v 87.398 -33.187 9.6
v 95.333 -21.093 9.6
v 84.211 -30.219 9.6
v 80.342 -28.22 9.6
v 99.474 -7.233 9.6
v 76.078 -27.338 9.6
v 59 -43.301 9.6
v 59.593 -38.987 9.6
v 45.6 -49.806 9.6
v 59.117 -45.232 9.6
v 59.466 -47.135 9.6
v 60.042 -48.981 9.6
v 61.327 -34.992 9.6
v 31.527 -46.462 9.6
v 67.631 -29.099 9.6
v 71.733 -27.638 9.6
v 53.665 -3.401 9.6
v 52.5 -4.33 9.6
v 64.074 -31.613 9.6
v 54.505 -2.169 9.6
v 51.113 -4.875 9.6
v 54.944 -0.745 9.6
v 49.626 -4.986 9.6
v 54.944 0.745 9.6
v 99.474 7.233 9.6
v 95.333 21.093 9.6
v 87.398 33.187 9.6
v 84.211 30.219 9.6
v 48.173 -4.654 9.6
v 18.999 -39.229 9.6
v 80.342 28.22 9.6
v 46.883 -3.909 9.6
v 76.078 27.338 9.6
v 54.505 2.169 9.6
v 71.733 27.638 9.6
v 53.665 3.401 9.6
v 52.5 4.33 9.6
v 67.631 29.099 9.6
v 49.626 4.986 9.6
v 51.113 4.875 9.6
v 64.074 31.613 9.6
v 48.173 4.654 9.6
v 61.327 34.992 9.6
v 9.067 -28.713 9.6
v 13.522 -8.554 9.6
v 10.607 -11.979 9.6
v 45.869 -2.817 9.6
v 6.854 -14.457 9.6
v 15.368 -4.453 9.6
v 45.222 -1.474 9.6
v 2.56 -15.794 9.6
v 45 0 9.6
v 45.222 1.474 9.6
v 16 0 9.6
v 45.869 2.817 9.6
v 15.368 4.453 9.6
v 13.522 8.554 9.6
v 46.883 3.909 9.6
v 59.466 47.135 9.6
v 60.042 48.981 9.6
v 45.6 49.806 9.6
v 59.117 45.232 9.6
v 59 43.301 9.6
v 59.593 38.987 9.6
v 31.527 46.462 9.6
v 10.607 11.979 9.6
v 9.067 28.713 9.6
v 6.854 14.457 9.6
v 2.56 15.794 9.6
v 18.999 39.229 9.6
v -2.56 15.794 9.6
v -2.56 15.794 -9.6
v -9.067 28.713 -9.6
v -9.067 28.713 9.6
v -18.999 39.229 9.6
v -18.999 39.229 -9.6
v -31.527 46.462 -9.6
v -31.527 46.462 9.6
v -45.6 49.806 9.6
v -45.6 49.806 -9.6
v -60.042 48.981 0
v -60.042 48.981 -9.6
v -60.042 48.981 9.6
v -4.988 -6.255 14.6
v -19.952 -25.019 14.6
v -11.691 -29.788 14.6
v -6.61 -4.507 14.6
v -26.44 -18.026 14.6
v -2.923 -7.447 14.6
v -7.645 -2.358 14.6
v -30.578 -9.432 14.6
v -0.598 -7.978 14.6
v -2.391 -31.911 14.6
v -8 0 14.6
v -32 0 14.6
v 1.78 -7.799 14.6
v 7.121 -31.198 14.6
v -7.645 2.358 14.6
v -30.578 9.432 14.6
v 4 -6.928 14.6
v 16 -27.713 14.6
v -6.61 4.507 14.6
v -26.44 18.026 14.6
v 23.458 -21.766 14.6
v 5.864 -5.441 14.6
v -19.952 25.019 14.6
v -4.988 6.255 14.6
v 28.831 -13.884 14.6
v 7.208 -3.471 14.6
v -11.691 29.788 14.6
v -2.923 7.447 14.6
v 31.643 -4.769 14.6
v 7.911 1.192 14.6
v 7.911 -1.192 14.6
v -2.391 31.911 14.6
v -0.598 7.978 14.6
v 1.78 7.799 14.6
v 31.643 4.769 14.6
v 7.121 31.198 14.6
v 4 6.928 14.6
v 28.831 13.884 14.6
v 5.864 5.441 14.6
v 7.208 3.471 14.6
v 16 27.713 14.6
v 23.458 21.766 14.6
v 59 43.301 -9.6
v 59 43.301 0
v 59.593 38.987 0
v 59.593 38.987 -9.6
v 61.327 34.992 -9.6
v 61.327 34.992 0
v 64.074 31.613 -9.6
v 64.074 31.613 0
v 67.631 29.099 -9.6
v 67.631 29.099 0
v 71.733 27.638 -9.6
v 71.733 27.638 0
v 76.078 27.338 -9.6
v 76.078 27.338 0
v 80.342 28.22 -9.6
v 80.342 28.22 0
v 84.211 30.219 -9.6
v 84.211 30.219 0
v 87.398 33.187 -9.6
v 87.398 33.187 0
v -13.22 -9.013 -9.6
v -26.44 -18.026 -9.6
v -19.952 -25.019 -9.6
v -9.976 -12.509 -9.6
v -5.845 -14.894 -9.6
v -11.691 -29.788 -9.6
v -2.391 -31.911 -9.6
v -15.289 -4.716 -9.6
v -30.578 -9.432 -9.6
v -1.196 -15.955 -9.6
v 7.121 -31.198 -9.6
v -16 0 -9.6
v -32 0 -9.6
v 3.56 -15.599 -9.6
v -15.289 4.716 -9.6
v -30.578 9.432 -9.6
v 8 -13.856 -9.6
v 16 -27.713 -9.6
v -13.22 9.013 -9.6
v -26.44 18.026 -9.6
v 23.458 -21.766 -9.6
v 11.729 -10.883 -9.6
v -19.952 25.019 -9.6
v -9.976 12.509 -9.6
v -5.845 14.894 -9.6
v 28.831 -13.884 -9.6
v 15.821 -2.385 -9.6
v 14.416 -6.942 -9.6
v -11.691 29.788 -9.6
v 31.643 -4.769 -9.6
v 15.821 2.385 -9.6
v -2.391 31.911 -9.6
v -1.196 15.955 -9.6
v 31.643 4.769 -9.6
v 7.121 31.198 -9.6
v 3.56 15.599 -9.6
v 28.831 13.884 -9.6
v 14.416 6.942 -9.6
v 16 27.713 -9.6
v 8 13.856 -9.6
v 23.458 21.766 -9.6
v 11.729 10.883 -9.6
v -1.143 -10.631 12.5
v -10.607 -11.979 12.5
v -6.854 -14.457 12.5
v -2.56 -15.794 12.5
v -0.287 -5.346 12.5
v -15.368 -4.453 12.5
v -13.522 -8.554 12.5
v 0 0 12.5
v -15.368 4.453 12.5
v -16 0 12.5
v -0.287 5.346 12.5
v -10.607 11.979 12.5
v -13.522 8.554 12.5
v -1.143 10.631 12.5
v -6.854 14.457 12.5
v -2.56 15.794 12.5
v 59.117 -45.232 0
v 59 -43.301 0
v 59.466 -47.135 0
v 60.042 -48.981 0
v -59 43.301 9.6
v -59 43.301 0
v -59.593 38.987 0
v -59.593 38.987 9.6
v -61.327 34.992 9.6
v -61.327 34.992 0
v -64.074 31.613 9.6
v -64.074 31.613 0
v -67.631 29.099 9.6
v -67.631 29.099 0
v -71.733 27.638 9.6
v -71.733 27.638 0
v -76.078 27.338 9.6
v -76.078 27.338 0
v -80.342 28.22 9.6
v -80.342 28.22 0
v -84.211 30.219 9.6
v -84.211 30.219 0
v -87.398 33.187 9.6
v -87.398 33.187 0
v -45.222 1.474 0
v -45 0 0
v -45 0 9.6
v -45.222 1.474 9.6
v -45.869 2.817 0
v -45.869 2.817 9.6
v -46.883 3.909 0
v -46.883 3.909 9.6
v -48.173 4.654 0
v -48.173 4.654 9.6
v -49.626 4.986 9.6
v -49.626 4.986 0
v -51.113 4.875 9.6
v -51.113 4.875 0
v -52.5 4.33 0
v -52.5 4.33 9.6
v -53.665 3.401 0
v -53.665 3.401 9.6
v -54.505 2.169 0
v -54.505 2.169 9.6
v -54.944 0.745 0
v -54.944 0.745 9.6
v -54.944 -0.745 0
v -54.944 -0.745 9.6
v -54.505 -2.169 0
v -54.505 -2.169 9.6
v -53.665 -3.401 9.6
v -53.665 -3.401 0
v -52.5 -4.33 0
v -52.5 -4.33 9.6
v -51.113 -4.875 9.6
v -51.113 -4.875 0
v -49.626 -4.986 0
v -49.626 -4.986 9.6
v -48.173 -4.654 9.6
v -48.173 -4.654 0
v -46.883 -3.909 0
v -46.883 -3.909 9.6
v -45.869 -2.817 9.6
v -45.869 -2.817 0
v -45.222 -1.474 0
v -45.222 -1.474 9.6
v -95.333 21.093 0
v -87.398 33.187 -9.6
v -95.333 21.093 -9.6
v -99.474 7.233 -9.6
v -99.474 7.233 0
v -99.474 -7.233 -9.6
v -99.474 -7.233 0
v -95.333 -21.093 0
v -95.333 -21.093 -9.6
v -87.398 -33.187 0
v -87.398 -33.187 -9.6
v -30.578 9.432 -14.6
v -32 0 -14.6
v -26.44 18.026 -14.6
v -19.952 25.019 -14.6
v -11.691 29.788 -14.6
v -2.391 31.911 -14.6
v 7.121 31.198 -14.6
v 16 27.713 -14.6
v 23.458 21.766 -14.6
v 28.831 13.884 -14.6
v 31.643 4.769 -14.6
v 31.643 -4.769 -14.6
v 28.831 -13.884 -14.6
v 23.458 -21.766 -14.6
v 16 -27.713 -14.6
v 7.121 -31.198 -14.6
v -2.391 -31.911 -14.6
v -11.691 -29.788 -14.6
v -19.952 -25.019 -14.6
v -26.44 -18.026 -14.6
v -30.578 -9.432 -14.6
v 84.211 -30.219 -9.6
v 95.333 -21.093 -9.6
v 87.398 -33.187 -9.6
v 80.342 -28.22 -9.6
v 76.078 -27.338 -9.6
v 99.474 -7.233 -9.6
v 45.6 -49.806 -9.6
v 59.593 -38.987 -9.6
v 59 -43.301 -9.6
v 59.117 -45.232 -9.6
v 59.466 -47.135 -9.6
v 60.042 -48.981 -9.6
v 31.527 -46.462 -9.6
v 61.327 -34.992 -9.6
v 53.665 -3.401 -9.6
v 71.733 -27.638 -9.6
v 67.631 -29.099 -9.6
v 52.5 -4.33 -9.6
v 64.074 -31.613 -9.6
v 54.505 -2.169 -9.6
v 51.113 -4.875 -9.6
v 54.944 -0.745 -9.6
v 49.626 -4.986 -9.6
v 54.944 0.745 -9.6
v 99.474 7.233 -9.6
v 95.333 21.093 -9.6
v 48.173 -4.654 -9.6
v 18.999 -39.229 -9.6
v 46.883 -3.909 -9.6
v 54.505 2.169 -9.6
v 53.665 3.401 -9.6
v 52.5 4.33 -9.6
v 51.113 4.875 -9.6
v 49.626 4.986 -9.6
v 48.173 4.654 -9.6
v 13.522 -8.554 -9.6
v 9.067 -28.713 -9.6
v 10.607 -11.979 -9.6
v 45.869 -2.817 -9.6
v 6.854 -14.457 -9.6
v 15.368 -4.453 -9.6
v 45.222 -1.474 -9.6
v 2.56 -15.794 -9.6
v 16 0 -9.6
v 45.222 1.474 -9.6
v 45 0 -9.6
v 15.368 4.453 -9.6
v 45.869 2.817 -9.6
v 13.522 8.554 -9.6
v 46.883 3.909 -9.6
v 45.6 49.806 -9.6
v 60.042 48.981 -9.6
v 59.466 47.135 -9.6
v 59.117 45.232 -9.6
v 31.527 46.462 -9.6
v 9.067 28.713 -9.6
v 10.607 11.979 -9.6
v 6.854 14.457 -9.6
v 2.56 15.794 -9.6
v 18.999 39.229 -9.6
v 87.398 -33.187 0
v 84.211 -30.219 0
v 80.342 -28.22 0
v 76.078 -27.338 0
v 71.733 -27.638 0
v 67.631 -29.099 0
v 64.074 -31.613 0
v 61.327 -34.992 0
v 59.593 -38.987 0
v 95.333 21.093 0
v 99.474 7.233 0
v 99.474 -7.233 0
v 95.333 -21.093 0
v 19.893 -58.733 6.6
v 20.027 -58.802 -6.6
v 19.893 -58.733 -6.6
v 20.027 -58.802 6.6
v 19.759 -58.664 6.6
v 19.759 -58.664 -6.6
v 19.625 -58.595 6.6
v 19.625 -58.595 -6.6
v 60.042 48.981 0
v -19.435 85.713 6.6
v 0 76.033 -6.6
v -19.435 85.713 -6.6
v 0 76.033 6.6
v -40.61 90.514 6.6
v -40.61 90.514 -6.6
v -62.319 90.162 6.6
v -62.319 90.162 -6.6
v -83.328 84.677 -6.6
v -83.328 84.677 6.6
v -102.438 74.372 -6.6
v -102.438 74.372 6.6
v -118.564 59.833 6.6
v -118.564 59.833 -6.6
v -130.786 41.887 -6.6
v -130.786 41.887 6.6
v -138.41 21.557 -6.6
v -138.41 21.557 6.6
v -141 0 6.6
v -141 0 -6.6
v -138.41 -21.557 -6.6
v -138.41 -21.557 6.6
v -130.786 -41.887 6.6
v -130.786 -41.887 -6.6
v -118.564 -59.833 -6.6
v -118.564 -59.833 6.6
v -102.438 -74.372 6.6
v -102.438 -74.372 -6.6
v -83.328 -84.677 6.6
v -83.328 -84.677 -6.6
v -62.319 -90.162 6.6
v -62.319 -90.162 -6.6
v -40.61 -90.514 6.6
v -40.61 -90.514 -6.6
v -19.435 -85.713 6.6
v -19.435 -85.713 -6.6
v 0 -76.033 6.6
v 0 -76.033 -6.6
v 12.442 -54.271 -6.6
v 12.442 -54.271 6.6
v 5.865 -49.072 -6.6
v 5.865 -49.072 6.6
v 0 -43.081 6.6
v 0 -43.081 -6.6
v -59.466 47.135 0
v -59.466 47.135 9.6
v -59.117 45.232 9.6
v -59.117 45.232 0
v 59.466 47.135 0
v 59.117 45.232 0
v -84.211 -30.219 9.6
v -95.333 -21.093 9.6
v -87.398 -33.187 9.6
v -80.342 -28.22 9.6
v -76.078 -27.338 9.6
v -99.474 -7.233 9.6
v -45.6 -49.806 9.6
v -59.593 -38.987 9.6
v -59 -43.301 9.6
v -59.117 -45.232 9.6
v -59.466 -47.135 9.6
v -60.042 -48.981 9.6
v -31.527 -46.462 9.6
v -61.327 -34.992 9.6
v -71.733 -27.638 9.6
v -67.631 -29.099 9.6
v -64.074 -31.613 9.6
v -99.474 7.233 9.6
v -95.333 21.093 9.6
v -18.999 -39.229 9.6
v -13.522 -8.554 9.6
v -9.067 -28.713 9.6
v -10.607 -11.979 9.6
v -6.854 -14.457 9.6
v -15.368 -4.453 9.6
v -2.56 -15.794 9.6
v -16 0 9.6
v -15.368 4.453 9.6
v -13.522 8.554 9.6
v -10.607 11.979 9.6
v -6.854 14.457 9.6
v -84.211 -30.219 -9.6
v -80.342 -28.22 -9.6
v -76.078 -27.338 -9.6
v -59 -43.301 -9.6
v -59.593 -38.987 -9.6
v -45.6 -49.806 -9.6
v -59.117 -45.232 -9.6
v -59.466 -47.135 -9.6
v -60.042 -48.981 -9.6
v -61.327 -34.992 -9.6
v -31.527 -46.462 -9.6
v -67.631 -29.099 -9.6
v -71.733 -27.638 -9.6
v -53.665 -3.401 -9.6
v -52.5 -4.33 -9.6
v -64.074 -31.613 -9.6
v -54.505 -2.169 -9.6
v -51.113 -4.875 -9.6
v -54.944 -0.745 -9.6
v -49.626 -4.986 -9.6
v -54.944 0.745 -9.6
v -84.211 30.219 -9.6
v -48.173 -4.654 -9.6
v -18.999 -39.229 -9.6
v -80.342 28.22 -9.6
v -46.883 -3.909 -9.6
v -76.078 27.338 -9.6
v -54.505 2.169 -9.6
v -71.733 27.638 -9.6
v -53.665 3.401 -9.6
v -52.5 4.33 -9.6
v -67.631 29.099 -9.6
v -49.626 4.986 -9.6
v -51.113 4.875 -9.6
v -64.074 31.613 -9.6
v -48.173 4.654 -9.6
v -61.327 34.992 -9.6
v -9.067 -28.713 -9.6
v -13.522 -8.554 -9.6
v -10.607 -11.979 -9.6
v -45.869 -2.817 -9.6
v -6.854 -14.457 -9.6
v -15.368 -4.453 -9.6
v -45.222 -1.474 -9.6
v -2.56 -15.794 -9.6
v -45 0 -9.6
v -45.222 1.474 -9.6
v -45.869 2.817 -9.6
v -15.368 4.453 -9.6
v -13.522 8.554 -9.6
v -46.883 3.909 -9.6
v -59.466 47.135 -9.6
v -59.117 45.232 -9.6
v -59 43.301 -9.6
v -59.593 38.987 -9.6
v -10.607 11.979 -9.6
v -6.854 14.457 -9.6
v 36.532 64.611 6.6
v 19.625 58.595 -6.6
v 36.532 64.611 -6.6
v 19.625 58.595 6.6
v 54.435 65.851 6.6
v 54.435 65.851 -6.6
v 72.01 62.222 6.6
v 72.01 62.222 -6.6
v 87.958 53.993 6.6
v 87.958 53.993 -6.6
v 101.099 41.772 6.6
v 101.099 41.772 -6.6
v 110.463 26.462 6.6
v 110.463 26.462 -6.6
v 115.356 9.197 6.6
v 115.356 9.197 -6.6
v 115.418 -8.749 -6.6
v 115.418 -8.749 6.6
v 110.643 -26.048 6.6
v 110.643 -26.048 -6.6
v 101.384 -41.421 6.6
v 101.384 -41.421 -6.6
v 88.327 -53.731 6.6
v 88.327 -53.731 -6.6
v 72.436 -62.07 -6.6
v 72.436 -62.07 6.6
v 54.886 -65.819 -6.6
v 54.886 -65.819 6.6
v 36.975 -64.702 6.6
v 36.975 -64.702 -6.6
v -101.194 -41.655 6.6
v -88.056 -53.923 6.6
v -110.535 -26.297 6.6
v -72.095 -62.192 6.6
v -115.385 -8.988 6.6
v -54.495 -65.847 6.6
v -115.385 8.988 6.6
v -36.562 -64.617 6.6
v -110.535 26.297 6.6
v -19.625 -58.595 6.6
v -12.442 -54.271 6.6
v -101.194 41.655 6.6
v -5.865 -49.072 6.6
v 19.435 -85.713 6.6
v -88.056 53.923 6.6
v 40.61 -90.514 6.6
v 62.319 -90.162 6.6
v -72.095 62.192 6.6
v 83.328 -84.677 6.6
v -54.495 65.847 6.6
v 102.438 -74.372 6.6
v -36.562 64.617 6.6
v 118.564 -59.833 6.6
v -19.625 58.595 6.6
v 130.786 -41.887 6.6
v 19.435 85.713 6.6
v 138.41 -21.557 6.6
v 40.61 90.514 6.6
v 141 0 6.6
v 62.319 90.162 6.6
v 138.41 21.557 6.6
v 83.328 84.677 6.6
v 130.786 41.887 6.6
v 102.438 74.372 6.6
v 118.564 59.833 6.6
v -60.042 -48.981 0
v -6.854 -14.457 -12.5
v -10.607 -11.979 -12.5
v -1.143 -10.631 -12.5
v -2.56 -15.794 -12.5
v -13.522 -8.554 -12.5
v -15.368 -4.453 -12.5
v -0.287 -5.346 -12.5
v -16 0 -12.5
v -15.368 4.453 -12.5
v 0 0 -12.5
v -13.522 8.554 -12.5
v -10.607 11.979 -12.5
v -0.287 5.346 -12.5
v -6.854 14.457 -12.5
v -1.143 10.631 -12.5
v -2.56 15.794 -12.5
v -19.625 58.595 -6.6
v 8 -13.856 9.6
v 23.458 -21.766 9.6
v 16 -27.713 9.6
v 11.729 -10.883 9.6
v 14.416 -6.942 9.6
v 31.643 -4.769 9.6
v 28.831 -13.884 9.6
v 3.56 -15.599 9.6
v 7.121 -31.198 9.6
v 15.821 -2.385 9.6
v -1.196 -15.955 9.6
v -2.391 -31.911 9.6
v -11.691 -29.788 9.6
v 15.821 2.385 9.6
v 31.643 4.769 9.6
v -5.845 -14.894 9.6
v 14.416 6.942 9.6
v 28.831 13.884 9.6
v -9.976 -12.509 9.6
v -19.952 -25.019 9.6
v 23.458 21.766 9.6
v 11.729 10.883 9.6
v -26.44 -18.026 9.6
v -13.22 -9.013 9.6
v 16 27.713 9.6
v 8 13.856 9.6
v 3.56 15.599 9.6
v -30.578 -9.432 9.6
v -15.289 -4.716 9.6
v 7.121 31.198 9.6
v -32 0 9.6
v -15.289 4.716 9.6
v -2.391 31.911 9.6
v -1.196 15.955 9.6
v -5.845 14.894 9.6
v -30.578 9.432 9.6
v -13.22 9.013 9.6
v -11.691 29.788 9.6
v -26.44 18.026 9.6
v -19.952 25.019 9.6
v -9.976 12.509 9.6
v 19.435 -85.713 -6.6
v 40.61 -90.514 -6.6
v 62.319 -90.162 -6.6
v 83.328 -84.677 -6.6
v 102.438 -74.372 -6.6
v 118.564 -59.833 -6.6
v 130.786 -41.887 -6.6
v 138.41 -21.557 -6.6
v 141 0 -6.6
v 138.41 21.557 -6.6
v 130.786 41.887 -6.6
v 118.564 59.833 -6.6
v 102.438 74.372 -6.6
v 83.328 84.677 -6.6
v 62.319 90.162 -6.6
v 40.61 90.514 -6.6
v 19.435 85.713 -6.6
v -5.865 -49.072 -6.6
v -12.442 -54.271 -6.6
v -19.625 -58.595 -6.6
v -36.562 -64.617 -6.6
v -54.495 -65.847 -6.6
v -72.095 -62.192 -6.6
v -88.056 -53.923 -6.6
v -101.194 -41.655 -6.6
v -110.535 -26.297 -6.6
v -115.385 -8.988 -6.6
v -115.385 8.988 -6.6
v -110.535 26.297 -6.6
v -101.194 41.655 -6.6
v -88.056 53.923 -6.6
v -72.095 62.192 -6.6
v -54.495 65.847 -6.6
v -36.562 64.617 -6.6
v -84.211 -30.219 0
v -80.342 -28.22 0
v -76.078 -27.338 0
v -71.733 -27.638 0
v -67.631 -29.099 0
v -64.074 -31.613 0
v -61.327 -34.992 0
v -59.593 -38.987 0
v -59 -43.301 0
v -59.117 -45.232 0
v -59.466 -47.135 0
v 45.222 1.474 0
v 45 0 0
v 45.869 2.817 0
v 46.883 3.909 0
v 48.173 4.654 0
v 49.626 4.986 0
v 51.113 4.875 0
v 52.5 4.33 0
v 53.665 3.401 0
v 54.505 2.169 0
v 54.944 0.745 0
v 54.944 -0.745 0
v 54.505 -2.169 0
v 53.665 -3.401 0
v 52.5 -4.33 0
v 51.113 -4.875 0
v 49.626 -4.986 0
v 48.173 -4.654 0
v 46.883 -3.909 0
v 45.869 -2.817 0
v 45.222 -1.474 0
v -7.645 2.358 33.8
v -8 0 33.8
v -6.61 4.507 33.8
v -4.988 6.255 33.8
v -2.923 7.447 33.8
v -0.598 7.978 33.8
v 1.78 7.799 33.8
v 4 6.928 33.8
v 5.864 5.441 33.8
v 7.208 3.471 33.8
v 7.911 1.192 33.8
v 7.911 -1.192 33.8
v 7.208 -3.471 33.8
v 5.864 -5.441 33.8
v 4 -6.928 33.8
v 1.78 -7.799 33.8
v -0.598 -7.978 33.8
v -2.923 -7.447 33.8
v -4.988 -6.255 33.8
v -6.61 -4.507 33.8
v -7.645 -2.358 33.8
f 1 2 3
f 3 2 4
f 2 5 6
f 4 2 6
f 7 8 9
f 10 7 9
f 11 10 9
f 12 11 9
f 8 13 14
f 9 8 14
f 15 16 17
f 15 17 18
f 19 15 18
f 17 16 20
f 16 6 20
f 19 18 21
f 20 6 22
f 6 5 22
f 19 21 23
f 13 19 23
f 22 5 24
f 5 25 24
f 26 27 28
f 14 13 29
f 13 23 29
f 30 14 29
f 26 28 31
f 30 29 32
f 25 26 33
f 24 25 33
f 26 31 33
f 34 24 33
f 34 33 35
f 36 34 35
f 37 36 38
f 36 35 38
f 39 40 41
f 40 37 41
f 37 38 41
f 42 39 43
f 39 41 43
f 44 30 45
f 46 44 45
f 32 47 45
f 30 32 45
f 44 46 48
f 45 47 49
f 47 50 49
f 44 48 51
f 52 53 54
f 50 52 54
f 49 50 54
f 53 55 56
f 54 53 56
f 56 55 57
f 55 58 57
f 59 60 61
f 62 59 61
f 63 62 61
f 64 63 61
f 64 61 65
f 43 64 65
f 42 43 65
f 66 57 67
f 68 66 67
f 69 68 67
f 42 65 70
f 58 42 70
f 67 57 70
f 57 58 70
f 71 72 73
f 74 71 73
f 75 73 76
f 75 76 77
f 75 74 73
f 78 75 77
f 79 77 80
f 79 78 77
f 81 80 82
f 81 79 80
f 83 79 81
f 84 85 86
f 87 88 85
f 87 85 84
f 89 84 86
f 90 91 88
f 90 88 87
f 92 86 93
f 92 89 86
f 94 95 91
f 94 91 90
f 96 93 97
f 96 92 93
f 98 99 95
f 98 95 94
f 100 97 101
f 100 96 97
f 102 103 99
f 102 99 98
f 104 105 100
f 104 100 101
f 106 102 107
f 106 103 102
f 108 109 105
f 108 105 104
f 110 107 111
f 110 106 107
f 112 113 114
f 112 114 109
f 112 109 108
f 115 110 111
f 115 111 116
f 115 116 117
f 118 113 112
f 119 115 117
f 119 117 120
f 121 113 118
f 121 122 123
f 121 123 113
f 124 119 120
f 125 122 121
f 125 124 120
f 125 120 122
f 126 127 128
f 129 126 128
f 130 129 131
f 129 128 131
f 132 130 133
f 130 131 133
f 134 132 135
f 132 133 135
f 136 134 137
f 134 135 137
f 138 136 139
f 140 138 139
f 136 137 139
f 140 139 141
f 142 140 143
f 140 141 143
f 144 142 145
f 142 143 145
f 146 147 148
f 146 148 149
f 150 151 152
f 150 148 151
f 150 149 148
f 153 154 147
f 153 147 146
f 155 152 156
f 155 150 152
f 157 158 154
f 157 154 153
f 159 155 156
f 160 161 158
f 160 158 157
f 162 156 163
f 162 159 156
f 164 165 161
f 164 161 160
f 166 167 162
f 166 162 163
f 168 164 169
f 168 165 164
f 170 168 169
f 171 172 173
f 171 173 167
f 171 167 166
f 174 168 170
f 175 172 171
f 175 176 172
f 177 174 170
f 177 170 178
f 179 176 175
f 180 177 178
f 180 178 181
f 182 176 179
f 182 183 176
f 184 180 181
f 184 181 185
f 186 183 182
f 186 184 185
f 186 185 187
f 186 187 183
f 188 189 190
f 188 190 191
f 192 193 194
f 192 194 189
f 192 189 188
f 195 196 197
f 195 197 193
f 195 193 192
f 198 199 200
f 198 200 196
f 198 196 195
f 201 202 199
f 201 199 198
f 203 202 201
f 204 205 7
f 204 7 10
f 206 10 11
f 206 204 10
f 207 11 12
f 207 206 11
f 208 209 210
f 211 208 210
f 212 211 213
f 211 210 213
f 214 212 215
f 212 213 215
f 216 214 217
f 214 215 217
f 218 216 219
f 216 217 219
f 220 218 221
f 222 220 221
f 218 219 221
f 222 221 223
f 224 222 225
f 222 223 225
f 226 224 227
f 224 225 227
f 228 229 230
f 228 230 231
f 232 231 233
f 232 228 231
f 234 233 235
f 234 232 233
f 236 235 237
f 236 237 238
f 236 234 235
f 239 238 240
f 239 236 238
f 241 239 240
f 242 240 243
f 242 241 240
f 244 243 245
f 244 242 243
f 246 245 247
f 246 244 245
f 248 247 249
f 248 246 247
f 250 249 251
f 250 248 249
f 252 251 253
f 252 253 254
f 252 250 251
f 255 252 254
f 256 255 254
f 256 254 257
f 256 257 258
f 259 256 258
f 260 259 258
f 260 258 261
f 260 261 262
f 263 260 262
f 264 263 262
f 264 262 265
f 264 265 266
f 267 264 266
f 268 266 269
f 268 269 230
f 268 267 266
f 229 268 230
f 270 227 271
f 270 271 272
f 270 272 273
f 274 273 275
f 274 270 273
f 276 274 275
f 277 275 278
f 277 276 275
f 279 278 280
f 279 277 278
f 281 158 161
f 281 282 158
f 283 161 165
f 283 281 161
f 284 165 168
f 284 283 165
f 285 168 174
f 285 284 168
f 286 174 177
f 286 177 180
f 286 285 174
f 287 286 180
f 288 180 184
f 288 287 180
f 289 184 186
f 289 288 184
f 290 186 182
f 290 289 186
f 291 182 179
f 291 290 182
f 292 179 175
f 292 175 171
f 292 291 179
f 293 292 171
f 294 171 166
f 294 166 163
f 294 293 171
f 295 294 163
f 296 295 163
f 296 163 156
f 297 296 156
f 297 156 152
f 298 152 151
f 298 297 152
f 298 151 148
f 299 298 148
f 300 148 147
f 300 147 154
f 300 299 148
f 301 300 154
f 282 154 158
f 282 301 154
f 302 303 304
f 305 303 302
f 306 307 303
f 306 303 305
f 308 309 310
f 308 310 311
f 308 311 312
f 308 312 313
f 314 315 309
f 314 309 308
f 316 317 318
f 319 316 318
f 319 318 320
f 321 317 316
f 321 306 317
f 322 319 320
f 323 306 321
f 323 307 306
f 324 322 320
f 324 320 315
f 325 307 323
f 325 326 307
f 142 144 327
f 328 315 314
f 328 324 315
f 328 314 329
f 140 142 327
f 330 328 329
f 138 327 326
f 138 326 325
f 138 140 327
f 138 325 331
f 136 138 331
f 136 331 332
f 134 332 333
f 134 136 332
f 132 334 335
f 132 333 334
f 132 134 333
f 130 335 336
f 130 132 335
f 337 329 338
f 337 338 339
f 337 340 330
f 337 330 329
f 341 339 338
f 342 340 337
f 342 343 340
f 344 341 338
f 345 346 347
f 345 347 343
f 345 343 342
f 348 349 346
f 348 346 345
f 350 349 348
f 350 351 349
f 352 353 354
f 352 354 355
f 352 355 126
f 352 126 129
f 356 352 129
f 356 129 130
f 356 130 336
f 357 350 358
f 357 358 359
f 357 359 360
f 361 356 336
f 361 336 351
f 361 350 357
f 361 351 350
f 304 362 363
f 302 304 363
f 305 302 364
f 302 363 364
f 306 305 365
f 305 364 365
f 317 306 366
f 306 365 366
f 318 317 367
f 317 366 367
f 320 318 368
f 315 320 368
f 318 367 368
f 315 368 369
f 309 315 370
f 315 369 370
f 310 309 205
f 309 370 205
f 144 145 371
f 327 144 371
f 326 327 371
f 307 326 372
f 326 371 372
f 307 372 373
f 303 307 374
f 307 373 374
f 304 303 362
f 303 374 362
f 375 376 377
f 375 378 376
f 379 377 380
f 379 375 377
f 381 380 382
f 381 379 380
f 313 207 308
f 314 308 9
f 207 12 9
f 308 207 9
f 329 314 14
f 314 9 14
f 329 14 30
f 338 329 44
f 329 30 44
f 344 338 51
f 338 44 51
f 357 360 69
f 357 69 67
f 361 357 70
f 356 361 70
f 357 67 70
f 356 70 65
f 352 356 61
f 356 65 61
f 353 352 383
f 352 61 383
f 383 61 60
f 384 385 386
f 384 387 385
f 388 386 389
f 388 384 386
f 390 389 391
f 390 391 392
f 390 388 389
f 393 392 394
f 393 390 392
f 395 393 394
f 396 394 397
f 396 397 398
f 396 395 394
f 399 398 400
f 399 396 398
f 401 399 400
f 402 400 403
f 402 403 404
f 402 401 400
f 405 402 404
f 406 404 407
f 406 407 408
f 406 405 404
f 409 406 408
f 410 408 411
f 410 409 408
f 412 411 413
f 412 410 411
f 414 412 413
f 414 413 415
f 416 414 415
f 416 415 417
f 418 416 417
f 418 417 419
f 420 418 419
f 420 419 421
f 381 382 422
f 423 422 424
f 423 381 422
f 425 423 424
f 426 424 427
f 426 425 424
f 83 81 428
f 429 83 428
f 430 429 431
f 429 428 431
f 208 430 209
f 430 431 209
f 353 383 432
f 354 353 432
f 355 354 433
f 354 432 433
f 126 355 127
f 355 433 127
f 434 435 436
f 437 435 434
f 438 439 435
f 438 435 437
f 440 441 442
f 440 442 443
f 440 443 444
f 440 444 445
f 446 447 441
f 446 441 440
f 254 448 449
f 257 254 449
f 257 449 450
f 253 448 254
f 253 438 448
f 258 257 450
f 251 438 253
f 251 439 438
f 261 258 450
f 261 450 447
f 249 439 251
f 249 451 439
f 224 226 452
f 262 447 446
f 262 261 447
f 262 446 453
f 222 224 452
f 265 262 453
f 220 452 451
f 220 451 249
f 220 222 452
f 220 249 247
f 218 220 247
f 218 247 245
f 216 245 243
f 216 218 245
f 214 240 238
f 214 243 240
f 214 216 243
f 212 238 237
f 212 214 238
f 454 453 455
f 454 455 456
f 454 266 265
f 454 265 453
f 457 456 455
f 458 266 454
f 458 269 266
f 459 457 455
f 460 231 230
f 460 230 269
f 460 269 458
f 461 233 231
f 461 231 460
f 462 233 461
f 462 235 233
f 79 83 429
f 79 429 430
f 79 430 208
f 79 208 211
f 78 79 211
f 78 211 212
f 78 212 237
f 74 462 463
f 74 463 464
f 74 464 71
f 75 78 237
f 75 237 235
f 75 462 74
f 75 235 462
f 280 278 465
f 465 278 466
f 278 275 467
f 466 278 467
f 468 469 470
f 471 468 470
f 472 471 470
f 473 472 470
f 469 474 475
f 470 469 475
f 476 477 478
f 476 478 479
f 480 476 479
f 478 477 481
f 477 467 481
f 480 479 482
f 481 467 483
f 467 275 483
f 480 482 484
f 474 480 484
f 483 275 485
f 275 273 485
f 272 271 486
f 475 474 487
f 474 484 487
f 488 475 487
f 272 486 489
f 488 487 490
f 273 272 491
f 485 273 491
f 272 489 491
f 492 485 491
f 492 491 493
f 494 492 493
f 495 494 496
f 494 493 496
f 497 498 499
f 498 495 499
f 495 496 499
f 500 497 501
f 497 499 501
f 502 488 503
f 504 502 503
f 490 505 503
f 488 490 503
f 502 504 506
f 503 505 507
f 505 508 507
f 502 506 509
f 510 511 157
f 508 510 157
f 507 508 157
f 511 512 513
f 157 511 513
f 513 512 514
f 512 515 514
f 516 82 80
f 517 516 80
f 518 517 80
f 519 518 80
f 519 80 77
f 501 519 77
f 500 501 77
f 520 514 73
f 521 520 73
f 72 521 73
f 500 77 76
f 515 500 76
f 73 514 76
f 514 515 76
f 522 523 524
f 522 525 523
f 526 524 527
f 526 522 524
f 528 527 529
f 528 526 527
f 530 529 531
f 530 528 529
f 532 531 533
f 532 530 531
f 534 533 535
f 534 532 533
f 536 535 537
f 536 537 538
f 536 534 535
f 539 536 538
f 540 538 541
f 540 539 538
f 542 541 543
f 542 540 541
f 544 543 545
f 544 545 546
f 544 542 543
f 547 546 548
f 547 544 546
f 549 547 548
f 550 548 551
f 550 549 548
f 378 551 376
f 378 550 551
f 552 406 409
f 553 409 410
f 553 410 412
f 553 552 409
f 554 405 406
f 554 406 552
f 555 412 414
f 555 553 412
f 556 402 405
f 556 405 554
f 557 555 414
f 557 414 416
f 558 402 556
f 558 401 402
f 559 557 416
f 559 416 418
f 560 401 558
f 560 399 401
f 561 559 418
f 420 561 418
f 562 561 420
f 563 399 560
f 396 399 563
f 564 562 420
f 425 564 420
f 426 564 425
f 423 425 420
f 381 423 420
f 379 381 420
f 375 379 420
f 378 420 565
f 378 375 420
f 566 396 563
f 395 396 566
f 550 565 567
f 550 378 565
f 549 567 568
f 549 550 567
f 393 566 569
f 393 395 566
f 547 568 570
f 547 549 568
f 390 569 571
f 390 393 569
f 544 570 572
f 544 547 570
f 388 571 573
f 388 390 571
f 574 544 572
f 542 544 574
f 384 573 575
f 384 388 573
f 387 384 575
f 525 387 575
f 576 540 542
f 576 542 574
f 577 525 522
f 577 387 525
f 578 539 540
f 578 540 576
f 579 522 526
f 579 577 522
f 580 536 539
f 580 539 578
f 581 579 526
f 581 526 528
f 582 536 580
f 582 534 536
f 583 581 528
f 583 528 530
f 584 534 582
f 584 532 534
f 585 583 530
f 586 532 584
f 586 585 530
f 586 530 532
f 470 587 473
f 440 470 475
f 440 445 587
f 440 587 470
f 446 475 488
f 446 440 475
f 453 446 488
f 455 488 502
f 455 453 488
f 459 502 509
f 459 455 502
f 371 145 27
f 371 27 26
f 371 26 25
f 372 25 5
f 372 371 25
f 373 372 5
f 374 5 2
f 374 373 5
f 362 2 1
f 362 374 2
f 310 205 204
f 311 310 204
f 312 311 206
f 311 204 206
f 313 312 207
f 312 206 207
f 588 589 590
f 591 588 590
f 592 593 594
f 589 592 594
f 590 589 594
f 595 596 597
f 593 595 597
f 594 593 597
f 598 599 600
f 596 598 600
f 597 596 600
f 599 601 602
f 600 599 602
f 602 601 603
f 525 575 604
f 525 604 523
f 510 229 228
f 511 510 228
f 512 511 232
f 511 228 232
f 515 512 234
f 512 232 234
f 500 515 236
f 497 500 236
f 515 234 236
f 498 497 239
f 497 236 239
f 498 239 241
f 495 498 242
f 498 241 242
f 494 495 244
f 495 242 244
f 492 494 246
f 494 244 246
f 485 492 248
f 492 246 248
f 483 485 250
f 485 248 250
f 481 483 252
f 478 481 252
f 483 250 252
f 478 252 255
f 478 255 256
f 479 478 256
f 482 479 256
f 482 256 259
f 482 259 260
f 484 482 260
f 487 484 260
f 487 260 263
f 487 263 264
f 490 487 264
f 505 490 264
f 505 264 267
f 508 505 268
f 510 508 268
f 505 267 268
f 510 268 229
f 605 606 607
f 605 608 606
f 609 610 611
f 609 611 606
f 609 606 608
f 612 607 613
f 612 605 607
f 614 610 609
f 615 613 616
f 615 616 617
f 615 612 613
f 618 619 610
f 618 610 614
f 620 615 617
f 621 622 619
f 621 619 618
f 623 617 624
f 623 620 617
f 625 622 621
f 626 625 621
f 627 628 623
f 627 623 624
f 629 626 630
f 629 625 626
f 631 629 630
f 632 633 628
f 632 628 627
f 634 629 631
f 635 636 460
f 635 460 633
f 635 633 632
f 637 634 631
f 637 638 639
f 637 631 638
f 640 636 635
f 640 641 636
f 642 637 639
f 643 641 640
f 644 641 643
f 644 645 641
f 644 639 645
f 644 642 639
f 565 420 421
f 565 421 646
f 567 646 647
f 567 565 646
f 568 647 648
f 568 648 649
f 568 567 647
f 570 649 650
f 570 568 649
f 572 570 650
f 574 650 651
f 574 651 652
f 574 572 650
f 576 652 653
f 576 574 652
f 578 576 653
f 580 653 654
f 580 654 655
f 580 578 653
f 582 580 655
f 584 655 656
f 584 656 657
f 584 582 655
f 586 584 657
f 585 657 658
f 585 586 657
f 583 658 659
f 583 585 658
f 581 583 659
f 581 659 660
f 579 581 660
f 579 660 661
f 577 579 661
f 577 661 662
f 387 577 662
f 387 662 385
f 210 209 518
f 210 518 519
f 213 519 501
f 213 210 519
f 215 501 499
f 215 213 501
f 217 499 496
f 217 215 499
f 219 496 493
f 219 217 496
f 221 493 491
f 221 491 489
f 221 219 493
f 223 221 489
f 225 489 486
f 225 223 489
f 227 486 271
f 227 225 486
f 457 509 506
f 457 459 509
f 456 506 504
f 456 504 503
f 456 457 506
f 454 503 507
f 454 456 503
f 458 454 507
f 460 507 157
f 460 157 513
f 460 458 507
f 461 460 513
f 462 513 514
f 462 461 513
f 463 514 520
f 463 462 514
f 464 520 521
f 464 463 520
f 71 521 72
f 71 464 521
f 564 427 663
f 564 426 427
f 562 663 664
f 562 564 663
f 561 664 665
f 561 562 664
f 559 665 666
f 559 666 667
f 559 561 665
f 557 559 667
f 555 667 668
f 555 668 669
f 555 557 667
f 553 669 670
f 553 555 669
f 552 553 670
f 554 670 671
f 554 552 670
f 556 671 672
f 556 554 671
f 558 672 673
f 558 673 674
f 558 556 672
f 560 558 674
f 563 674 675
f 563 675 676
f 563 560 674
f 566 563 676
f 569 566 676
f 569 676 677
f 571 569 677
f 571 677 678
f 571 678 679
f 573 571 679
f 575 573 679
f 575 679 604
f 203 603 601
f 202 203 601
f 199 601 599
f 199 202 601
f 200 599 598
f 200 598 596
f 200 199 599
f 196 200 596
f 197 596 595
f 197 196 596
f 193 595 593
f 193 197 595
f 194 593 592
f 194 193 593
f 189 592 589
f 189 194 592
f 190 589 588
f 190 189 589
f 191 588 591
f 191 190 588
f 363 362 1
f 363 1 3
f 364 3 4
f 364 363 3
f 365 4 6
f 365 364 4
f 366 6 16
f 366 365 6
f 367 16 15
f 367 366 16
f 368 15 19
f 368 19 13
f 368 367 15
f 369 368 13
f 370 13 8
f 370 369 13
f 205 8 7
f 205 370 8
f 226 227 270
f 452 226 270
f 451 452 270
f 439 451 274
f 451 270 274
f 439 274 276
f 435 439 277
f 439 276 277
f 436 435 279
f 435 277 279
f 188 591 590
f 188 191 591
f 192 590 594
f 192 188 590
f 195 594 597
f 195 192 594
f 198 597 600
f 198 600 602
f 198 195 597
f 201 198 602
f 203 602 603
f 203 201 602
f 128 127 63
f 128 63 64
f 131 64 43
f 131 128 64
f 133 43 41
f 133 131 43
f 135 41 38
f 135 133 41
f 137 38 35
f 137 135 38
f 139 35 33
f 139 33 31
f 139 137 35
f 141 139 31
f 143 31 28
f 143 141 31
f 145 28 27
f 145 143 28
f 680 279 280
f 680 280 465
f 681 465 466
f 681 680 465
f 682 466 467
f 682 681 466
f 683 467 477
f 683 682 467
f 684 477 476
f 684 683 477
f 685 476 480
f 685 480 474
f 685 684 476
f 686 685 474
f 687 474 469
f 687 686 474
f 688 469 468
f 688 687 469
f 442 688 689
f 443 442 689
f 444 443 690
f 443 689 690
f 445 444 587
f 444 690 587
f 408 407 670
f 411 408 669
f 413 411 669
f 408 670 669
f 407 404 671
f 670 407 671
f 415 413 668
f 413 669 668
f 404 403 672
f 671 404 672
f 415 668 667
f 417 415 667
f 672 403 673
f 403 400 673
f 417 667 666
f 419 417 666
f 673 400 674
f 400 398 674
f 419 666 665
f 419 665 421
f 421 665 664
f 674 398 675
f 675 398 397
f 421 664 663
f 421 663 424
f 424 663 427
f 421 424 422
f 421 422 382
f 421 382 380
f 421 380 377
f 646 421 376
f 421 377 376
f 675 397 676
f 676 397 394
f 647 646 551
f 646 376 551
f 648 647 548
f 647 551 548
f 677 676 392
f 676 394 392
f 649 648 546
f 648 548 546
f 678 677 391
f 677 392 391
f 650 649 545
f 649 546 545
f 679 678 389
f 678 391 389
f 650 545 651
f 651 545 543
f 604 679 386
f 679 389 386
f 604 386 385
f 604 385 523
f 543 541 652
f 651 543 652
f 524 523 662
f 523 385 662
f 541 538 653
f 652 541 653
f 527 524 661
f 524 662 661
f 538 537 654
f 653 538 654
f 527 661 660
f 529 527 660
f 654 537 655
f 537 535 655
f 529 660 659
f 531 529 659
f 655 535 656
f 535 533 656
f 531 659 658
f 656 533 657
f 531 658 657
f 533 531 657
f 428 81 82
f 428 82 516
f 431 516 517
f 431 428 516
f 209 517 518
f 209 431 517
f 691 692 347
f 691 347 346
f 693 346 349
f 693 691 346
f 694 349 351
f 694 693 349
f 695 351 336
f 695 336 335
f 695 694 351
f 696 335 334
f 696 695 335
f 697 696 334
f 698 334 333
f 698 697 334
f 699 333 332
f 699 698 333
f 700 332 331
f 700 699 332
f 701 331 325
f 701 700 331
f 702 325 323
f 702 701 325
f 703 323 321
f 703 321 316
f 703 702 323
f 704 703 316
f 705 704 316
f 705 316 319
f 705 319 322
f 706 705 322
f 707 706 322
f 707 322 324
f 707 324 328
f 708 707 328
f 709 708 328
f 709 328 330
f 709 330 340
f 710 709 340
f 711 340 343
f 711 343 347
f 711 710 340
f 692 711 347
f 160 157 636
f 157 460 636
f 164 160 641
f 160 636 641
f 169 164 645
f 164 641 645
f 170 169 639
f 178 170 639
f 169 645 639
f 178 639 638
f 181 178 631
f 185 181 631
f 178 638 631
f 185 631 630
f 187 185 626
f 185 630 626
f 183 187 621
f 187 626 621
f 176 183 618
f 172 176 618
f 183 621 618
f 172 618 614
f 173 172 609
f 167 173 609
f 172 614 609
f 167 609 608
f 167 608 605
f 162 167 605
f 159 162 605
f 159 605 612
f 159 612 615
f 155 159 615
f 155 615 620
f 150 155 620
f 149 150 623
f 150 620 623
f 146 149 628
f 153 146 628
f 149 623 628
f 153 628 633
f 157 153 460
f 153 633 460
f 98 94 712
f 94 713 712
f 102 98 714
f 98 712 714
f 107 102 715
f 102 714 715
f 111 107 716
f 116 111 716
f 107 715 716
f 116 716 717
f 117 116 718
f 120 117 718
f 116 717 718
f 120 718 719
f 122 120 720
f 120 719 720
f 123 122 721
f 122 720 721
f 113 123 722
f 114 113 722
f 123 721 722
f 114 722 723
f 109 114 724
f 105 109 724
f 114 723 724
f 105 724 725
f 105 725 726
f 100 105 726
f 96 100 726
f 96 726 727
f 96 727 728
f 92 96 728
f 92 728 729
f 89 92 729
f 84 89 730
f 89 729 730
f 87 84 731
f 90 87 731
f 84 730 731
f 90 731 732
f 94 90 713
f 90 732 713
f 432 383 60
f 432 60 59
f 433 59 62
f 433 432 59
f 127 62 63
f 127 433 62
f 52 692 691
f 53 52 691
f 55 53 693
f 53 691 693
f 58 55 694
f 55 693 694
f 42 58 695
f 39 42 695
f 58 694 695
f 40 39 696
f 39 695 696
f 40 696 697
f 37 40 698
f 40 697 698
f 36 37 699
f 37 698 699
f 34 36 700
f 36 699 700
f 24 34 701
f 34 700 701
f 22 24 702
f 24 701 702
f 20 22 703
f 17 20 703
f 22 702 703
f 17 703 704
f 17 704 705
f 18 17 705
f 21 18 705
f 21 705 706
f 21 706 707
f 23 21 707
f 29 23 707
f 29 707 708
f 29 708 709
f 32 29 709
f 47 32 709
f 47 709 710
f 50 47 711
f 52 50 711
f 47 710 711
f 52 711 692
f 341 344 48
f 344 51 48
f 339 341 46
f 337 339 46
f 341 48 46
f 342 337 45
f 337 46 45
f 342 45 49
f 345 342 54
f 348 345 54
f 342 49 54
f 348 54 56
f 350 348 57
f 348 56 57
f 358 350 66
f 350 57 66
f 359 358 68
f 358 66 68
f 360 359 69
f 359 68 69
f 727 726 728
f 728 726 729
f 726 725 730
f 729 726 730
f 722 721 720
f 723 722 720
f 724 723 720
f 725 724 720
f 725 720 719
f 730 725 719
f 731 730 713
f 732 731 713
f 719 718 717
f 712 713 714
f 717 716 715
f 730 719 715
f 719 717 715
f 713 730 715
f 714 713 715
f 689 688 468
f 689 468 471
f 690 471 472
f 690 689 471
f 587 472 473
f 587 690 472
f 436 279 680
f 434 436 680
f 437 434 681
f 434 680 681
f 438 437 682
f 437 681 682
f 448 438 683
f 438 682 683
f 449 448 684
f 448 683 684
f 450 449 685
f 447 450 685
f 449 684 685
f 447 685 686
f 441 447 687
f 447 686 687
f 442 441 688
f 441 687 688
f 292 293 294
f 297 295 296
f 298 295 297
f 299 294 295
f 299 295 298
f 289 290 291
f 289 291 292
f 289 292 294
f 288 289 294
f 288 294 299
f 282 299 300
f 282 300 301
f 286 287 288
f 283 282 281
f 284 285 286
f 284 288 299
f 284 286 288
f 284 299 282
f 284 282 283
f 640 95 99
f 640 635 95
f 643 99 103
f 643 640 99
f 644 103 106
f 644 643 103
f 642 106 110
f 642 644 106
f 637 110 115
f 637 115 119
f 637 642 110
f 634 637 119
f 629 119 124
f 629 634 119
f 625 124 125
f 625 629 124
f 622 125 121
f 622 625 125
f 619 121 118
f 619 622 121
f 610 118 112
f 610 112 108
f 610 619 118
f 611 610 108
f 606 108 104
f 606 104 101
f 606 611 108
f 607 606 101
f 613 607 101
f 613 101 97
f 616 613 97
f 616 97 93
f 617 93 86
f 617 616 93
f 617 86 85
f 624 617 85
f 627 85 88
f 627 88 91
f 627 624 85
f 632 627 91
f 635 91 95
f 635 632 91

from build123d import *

# Parameters (mm, degrees)
F0_R          = 5
F1_DEPTH      = 9.6
F2_DEPTH      = 12.5
F3_W          = 8
F3_H          = 19.2
F3_W_2        = 16
F7_DEPTH      = 6.6
F7_DEPTH_BACK = 6.6


# Not quite as in the source:
# - a feature names something its author has since deleted; it is built from what else it names


with BuildPart() as f1:
    # F0 (on Top) → F1 (new body, symmetric)
    with BuildSketch(Plane.XY):
        with BuildLine():
            ThreePointArc((-2.56, -15.7938722294), (-16, 0), (-2.56, 15.7938722294))
            ThreePointArc((-2.56, 15.7938722294), (-25, 43.3012701892), (-60.0421054252, 48.9811812703))
            ThreePointArc((-60.0421054252, 48.9811812703), (-59.2626826747, 46.1886294328), (-59, 43.3012701892))
            ThreePointArc((-59, 43.3012701892), (-69.6318677921, 28.2286739763), (-87.3978945748, 33.1873090408))
            ThreePointArc((-87.3978945748, 33.1873090408), (-100, 0), (-87.3978945748, -33.1873090408))
            ThreePointArc((-87.3978945748, -33.1873090408), (-69.6318677921, -28.2286739763), (-59, -43.3012701892))
            ThreePointArc((-59, -43.3012701892), (-59.2626826747, -46.1886294328), (-60.0421054252, -48.9811812703))
            ThreePointArc((-60.0421054252, -48.9811812703), (-25, -43.3012701892), (-2.56, -15.7938722294))
        make_face()
        with Locations((-50, 0)):
            Circle(F0_R, mode=Mode.SUBTRACT)
    extrude(amount=F1_DEPTH, both=True)


with BuildPart() as f2:
    # F0 (on Top) → F2 (new body, symmetric)
    with BuildSketch(Plane.XY):
        with BuildLine():
            ThreePointArc((-2.56, -15.7938722294), (-0.644149283, -8), (0, 0))
            ThreePointArc((0, 0), (-0.644149283, 8), (-2.56, 15.7938722294))
            ThreePointArc((-2.56, 15.7938722294), (-16, 0), (-2.56, -15.7938722294))
        make_face()
    extrude(amount=F2_DEPTH, both=True)


with BuildPart() as f4:
    # F3 (on Front) → F4 (revolve)
    with BuildSketch(Plane.XZ):
        Polygon((0, 9.6), (0, 12.5), (0, 14.6), (-8, 14.6), (-32, 14.6), (-32, 9.6), (-16, 9.6), align=None)
        with Locations((-4, 24.2)):
            Rectangle(F3_W, F3_H)
        with Locations((-8, 0)):
            Rectangle(F3_W_2, F3_H)
        Polygon((0, -12.5), (0, -9.6), (-16, -9.6), (-32, -9.6), (-32, -14.6), (0, -14.6), align=None)
    revolve(axis=Axis((0, 0, 0), (0, 0, -1)))


with BuildPart() as f5_1:
    # F5: instance of F1
    add(f1.part.mirror(Plane.YZ))


with BuildPart() as f7:
    # F6 (on Top) → F7 (new body, two sides)
    with BuildSketch(Plane.XY) as f7_sk:
        with BuildLine():
            ThreePointArc((0, 76.0328876211), (-141, 0), (0, -76.0328876211))
            ThreePointArc((0, -76.0328876211), (141, 0), (0, 76.0328876211))
        make_face()
        with BuildLine():
            ThreePointArc((-19.625, -58.5948749892), (-116, 0), (-19.625, 58.5948749892))
            Line((-19.625, 58.5948749892), (19.625, 58.5948749892))
            ThreePointArc((19.625, 58.5948749892), (115.9996126841, 0.2261095817), (20.0271913422, -58.8016219263))
            ThreePointArc((20.0271913422, -58.8016219263), (19.8259185969, -58.6985929259), (19.625, -58.5948749892))
            ThreePointArc((19.625, -58.5948749892), (9.070759043, -51.7764158153), (0, -43.0813184571))
            ThreePointArc((0, -43.0813184571), (-9.070759043, -51.7764158153), (-19.625, -58.5948749892))
        make_face(mode=Mode.SUBTRACT)
    extrude(amount=F7_DEPTH)
    extrude(f7_sk.sketch, amount=-F7_DEPTH_BACK)


solid = Compound([f1.part, f2.part, f4.part, f5_1.part, f7.part])
